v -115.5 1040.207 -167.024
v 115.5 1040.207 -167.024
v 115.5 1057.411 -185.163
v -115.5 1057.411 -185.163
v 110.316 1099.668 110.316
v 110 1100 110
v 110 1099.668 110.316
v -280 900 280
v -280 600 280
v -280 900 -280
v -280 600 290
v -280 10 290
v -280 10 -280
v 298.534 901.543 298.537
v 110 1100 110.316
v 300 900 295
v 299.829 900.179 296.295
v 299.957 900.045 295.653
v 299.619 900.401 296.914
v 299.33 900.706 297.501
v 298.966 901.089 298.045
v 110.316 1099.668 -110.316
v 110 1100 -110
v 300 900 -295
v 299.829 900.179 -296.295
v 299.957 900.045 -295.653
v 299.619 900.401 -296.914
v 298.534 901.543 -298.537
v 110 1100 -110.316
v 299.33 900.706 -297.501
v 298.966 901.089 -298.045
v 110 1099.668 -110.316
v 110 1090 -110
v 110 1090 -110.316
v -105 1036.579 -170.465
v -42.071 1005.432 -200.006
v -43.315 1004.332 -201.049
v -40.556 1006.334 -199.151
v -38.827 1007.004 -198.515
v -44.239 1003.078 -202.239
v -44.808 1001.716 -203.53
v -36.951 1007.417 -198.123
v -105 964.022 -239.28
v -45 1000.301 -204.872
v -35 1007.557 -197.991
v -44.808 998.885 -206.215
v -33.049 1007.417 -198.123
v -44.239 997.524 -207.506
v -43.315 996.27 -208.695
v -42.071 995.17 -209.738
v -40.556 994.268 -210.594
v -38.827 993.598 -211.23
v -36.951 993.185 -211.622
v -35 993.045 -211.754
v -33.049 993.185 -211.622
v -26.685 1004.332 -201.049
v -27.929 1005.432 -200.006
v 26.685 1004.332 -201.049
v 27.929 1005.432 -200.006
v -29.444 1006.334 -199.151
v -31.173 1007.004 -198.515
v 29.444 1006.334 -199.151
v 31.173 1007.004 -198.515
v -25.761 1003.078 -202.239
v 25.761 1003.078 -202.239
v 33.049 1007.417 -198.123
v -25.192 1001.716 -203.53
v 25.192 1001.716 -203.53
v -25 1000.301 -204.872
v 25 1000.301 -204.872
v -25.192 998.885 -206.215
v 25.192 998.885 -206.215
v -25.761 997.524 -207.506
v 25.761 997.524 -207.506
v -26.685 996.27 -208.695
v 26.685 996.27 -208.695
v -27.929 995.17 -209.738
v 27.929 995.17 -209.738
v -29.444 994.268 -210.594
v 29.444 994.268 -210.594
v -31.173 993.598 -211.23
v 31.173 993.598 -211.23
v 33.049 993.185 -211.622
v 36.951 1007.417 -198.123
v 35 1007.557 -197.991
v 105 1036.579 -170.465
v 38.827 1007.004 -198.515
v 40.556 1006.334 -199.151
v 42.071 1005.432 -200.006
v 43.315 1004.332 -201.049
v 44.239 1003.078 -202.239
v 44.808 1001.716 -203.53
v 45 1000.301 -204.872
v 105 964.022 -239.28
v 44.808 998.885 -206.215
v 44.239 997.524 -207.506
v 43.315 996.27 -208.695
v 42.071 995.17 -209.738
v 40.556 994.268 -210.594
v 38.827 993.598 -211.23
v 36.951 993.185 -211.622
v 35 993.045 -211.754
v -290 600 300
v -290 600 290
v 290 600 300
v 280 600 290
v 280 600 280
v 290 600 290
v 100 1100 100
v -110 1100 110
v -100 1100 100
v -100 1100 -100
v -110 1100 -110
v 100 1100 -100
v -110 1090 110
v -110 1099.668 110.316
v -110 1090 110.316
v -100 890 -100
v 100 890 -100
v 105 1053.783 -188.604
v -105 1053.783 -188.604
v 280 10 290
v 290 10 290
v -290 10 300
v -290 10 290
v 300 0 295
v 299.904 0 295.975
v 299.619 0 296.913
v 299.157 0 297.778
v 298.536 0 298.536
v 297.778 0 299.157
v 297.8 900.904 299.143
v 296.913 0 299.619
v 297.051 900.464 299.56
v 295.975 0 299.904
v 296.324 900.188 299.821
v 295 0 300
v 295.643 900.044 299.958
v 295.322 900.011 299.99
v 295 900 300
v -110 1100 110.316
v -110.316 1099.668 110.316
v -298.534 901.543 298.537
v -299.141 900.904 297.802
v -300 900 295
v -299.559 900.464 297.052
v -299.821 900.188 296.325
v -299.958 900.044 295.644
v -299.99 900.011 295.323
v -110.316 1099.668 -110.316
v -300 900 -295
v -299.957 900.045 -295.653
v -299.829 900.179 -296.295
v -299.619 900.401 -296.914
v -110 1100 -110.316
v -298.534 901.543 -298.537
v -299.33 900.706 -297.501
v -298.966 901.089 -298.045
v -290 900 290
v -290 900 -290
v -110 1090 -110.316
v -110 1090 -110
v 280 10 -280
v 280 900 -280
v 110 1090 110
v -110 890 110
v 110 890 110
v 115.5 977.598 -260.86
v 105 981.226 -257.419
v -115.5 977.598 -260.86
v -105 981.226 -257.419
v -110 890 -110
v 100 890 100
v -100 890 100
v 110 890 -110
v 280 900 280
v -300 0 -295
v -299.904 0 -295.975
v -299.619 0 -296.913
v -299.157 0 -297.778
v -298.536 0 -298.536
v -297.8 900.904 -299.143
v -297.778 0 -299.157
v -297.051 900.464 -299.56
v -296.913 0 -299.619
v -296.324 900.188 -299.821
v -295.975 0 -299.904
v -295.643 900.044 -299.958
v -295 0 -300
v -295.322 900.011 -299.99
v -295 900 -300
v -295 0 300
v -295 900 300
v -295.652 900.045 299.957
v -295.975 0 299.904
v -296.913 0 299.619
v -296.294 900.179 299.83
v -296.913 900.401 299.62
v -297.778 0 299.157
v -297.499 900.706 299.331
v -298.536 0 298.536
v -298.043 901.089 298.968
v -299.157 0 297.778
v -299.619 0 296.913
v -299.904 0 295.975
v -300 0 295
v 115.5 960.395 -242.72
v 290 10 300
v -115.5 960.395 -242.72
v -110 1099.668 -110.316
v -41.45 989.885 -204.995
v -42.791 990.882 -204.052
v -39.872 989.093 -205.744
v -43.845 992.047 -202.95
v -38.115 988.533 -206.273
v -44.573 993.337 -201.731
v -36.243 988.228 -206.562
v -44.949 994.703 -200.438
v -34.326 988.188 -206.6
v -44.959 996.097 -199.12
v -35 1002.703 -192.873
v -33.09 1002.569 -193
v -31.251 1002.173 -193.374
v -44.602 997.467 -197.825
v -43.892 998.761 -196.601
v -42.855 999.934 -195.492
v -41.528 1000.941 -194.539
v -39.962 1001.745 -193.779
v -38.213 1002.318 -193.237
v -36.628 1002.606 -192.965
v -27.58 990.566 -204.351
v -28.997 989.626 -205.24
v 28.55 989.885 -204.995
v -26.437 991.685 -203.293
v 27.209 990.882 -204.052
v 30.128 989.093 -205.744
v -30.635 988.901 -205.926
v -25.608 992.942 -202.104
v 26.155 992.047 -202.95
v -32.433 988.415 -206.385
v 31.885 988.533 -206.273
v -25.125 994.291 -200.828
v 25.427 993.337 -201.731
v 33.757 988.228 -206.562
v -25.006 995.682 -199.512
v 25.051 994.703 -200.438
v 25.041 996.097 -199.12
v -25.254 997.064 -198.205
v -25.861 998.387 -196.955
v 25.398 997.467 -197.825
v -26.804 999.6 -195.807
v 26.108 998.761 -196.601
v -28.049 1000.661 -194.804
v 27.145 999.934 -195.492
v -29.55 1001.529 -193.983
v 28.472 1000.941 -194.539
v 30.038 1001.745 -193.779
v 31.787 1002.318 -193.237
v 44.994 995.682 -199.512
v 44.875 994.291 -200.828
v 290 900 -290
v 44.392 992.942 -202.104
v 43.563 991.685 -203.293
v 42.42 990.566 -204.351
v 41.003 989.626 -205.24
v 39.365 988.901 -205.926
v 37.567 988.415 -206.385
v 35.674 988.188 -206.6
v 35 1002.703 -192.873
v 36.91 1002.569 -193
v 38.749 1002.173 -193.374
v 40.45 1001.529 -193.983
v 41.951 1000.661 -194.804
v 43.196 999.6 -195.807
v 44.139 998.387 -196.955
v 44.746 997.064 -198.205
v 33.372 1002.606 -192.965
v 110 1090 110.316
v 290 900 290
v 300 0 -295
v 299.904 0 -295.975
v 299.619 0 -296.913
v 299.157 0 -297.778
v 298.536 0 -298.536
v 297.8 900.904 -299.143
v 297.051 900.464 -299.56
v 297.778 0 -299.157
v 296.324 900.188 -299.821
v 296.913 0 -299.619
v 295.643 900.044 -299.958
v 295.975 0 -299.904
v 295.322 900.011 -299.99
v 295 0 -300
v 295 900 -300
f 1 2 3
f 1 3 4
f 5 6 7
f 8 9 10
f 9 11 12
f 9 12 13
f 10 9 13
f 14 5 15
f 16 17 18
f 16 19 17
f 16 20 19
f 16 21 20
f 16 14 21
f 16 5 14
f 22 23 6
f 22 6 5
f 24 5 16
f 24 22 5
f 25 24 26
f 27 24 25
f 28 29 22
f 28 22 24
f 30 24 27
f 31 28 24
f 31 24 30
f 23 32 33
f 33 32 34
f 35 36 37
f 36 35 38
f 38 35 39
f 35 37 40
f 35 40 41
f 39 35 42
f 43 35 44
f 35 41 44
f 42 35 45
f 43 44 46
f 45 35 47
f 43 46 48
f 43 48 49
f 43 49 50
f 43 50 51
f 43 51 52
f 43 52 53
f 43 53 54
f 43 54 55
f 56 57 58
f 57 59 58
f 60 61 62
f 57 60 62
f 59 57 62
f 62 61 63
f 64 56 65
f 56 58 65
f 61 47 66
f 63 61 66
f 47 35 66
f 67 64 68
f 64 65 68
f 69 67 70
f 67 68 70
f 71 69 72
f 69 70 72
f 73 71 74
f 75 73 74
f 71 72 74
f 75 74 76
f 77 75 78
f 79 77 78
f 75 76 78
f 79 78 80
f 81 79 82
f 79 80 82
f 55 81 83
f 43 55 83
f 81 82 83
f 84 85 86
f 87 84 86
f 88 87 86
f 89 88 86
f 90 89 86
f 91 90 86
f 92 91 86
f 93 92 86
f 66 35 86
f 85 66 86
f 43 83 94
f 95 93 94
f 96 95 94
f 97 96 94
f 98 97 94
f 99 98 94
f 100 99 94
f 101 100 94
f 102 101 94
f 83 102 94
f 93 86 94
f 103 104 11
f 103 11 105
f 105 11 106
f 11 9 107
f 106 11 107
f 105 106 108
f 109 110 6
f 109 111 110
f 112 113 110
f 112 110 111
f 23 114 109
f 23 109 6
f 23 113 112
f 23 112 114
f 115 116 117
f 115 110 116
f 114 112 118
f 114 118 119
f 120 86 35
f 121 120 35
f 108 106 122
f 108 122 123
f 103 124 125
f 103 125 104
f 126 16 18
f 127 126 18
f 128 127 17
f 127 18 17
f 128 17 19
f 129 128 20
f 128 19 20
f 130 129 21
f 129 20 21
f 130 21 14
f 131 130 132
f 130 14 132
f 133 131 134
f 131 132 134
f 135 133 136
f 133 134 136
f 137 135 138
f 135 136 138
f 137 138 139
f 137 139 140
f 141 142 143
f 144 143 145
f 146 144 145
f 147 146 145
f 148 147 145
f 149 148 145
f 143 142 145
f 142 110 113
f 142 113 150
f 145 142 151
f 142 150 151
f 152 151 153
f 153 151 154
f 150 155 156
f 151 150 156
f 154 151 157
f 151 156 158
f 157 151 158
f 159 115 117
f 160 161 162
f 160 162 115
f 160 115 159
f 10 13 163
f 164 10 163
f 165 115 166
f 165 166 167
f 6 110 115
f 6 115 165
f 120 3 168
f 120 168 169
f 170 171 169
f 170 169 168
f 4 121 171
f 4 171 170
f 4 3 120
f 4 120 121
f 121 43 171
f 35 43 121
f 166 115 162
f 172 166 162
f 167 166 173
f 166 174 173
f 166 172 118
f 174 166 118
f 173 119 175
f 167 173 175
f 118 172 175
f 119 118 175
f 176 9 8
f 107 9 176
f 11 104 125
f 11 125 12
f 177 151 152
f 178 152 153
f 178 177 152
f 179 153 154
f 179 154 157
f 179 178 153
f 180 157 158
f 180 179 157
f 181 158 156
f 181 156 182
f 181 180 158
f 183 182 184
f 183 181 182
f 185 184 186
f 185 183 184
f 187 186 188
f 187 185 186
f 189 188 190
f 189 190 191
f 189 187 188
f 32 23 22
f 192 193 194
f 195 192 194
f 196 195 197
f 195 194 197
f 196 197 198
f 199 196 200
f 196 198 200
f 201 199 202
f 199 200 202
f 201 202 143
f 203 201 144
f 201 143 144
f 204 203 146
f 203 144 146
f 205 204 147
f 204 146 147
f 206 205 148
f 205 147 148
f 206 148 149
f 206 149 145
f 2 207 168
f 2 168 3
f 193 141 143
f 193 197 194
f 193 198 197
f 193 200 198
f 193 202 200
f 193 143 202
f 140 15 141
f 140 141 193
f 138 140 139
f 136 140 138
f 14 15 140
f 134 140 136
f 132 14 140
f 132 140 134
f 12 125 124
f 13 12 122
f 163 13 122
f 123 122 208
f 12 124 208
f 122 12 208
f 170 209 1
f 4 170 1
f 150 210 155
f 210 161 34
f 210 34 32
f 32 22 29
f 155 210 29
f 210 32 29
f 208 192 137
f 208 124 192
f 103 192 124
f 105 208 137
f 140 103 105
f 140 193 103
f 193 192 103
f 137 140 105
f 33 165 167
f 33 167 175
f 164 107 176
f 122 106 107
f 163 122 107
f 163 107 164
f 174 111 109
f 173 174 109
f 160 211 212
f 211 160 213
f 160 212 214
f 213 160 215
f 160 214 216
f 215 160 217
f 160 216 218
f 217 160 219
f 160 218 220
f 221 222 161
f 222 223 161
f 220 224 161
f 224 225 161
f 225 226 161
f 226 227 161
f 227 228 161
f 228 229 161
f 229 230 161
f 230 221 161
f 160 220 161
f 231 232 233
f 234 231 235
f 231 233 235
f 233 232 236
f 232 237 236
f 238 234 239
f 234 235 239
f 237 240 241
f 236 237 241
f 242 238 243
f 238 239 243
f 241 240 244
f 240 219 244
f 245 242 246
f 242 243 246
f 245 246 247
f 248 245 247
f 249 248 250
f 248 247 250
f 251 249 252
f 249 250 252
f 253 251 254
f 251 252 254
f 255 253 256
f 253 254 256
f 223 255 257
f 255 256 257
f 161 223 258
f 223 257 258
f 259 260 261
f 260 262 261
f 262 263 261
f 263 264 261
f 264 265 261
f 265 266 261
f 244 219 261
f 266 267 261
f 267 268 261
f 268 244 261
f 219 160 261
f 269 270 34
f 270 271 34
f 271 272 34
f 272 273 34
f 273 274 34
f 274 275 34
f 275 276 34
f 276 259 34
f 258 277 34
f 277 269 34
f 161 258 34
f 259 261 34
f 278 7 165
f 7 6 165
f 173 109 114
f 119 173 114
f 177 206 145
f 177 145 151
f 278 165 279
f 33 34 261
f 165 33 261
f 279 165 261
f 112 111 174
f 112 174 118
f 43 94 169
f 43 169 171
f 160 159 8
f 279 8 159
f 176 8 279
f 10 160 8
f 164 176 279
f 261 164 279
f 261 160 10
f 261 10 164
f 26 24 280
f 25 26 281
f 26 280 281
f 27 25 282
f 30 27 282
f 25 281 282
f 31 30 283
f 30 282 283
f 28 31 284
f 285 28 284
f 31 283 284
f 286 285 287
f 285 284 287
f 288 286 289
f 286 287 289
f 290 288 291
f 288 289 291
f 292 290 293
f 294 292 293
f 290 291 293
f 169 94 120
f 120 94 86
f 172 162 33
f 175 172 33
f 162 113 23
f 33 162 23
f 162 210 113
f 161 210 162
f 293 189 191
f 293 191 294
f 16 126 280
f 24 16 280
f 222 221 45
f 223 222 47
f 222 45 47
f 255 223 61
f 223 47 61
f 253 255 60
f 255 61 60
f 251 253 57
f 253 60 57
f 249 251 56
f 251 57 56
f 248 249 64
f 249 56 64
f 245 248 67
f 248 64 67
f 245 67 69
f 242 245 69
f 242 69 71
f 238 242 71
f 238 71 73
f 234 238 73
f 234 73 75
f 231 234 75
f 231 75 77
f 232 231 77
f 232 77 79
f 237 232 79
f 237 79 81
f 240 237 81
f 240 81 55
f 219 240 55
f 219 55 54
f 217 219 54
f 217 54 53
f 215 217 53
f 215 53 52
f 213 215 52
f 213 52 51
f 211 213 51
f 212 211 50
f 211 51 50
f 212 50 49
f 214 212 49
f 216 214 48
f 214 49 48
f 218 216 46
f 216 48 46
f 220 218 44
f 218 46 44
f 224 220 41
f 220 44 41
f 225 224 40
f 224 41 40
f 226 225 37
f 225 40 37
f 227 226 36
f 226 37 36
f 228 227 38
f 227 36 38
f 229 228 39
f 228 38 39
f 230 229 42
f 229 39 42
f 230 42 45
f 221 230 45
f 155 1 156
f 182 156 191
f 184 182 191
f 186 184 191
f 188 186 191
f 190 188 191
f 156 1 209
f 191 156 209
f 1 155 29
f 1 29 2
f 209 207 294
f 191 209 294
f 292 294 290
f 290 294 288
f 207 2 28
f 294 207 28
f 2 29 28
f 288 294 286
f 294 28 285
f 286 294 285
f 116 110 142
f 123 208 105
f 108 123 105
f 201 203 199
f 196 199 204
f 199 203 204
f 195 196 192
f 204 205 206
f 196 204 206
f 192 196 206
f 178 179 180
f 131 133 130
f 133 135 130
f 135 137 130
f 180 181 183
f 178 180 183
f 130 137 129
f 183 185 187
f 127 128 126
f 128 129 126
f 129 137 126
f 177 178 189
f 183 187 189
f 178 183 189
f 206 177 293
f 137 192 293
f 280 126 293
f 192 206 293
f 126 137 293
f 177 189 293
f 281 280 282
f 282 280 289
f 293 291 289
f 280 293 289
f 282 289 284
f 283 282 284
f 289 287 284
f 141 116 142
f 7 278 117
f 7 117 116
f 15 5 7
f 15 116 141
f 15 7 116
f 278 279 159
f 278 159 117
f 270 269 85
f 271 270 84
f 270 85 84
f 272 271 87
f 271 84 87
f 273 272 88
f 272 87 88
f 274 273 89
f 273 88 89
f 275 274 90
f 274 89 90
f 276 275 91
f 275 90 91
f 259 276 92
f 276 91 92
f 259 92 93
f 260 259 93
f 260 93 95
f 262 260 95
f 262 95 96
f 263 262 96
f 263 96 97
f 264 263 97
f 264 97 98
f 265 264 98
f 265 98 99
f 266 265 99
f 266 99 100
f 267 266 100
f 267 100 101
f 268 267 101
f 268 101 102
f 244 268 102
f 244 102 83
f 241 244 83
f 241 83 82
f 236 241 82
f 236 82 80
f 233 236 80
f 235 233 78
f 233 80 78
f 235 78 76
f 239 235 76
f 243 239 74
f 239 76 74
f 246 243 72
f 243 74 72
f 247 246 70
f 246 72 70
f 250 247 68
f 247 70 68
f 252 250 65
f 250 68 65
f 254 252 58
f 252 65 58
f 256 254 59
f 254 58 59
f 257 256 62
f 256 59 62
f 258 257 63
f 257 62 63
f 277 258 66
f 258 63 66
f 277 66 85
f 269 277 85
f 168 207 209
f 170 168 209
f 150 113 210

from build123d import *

# Parameters (mm, degrees)
SKETCH1_W            = 600
SKETCH1_H            = 600
BOSS_EXTRUDE1_DEPTH  = 10
SKETCH2_W            = 600
SKETCH2_H            = 600
SKETCH2_W_2          = 560
SKETCH2_H_2          = 560
BOSS_AREA_C_DEPTH    = 590
SKETCH4_W            = 560
SKETCH4_H            = 20
CUT_AREA_C_DEPTH     = 590
SKETCH5_W            = 600
SKETCH5_H            = 600
SKETCH5_W_2          = 560
SKETCH5_H_2          = 560
AREA_B_DEPTH         = 300
SKETCH7_W            = 10
SKETCH7_H            = 590
CUT_EXTRUDE3_DEPTH   = 10
SKETCH8_W            = 220
SKETCH8_H            = 220
SKETCH8_W_2          = 200
SKETCH8_H_2          = 200
BOSS_EXTRUDE7_DEPTH  = 210
BOSS_EXTRUDE8_DEPTH  = 600
CUT_EXTRUDE4_DEPTH   = 600
BOSS_EXTRUDE9_DEPTH  = 600
CUT_EXTRUDE5_DEPTH   = 600
SKETCH16_W           = 231
SKETCH16_H           = 110
SKETCH16_W_2         = 210
SKETCH16_H_2         = 100
BOSS_EXTRUDE13_DEPTH = 25
SKETCH18_R           = 10
CUT_EXTRUDE6_DEPTH   = 35
FILLET1_R            = 5


with BuildPart() as part:
    # Sketch1 → Boss-Extrude1 (new body)
    with BuildSketch(Plane(origin=(0, 0, 0), x_dir=(1, 0, 0), z_dir=(0, 1, 0))):
        Rectangle(SKETCH1_W, SKETCH1_H)
    extrude(amount=BOSS_EXTRUDE1_DEPTH)

    # Sketch2 → Boss-Area C (add)
    with BuildSketch(Plane(origin=(0, 10, 0), x_dir=(1, 0, 0), z_dir=(0, 1, 0))):
        Rectangle(SKETCH2_W, SKETCH2_H)
        Rectangle(SKETCH2_W_2, SKETCH2_H_2, mode=Mode.SUBTRACT)
    extrude(amount=BOSS_AREA_C_DEPTH)

    # Sketch4 → Cut-Area C (cut)
    with BuildSketch(Plane(origin=(0, 600, 0), x_dir=(1, 0, 0), z_dir=(0, 1, 0))):
        with Locations((0, -290)):
            Rectangle(SKETCH4_W, SKETCH4_H)
    extrude(amount=-CUT_AREA_C_DEPTH, mode=Mode.SUBTRACT)

    # Sketch5 → Area B (add)
    with BuildSketch(Plane(origin=(0, 600, 0), x_dir=(1, 0, 0), z_dir=(0, 1, 0))):
        Rectangle(SKETCH5_W, SKETCH5_H)
        Rectangle(SKETCH5_W_2, SKETCH5_H_2, mode=Mode.SUBTRACT)
    extrude(amount=AREA_B_DEPTH)

    # Sketch7 → Cut-Extrude3 (cut)
    with BuildSketch(Plane.XY.offset(300)):
        with Locations((285, 305)):
            Rectangle(SKETCH7_W, SKETCH7_H)
        with Locations((-285, 305)):
            Rectangle(SKETCH7_W, SKETCH7_H)
    extrude(amount=-CUT_EXTRUDE3_DEPTH, mode=Mode.SUBTRACT)



with BuildPart() as body_2:
    # Sketch8 → Boss-Extrude7 (new body)
    with BuildSketch(Plane(origin=(0, 1100, 0), x_dir=(1, 0, 0), z_dir=(0, 1, 0))):
        Rectangle(SKETCH8_W, SKETCH8_H)
        Rectangle(SKETCH8_W_2, SKETCH8_H_2, mode=Mode.SUBTRACT)
    extrude(amount=-BOSS_EXTRUDE7_DEPTH)


with BuildPart() as part_1:
    add(part.part)

    add(body_2.part)  # Boss-Extrude8 merges body 2
    # Sketch9 → Boss-Extrude8 (add)
    with BuildSketch(Plane(origin=(0, 0, -300), x_dir=(-1, 0, 0), z_dir=(0, 0, -1))):
        Polygon((300, 900), (110, 1100), (110, 1090), (290, 900), align=None)
    boss_extrude8 = extrude(amount=-BOSS_EXTRUDE8_DEPTH)

    # Mirror1: Boss-Extrude8 across plane
    add(boss_extrude8.mirror(Plane(origin=(0, 0, 0), x_dir=(0, 0, 1), z_dir=(1, 0, 0))))

    # Sketch10 → Cut-Extrude4 (cut)
    with BuildSketch(Plane.ZY.offset(300)):
        Polygon((-300, 900), (-300, 1100), (-110, 1100), align=None)
        Polygon((300, 1100), (110, 1100), (300, 900), align=None)
    extrude(amount=-CUT_EXTRUDE4_DEPTH, mode=Mode.SUBTRACT)

    # Sketch13 → Boss-Extrude9 (add)
    with BuildSketch(Plane(origin=(300, 0, 0), x_dir=(0, 0, -1), z_dir=(1, 0, 0))):
        Polygon((-300, 900), (-290, 900), (-110.315522005, 1090), (-110.315522005, 1100), align=None)
        Polygon((300, 900), (290, 900), (110.315522005, 1090), (110.315522005, 1100), align=None)
    extrude(amount=-BOSS_EXTRUDE9_DEPTH)

    # Sketch14 → Cut-Extrude5 (cut)
    with BuildSketch(Plane(origin=(0, 0, -300), x_dir=(-1, 0, 0), z_dir=(0, 0, -1))):
        Polygon((-110, 1100), (-300, 900), (-300, 1100), align=None)
        Polygon((300, 1100), (110, 1100), (300, 900), align=None)
    extrude(amount=-CUT_EXTRUDE5_DEPTH, mode=Mode.SUBTRACT)

    # Sketch16 → Boss-Extrude13 (add)
    with BuildSketch(Plane(origin=(0, 575.982283096, -607.305657461), x_dir=(-1, 0, 0), z_dir=(0, 0.6881475597150754, -0.7255707657135773))):
        with Locations((0, 584.806743705)):
            Rectangle(SKETCH16_W, SKETCH16_H)
        with Locations((0, 584.806743705)):
            Rectangle(SKETCH16_W_2, SKETCH16_H_2, mode=Mode.SUBTRACT)
    extrude(amount=BOSS_EXTRUDE13_DEPTH)

    # Sketch18 → Cut-Extrude6 (cut)
    with BuildSketch(Plane(origin=(0, 575.982283096, -607.305657461), x_dir=(-1, 0, 0), z_dir=(0, 0.6881475597150754, -0.7255707657135773))):
        with Locations(Location((-35, 584.806743705, 0), (0, 0, 90))):
            Circle(SKETCH18_R)
        with Locations(Location((35, 584.806743705, 0), (0, 0, 90))):
            Circle(SKETCH18_R)
    extrude(amount=-CUT_EXTRUDE6_DEPTH, mode=Mode.SUBTRACT)

    # Fillet1
    fillet1_edges = [part_1.edges().sort_by_distance(p)[0] for p in [
        (300, 450, 300),
        (-300, 450, 300),
        (-300, 450, -300),
        (300, 450, -300),
    ]]
    fillet(fillet1_edges, radius=FILLET1_R)


solid = part_1.part
